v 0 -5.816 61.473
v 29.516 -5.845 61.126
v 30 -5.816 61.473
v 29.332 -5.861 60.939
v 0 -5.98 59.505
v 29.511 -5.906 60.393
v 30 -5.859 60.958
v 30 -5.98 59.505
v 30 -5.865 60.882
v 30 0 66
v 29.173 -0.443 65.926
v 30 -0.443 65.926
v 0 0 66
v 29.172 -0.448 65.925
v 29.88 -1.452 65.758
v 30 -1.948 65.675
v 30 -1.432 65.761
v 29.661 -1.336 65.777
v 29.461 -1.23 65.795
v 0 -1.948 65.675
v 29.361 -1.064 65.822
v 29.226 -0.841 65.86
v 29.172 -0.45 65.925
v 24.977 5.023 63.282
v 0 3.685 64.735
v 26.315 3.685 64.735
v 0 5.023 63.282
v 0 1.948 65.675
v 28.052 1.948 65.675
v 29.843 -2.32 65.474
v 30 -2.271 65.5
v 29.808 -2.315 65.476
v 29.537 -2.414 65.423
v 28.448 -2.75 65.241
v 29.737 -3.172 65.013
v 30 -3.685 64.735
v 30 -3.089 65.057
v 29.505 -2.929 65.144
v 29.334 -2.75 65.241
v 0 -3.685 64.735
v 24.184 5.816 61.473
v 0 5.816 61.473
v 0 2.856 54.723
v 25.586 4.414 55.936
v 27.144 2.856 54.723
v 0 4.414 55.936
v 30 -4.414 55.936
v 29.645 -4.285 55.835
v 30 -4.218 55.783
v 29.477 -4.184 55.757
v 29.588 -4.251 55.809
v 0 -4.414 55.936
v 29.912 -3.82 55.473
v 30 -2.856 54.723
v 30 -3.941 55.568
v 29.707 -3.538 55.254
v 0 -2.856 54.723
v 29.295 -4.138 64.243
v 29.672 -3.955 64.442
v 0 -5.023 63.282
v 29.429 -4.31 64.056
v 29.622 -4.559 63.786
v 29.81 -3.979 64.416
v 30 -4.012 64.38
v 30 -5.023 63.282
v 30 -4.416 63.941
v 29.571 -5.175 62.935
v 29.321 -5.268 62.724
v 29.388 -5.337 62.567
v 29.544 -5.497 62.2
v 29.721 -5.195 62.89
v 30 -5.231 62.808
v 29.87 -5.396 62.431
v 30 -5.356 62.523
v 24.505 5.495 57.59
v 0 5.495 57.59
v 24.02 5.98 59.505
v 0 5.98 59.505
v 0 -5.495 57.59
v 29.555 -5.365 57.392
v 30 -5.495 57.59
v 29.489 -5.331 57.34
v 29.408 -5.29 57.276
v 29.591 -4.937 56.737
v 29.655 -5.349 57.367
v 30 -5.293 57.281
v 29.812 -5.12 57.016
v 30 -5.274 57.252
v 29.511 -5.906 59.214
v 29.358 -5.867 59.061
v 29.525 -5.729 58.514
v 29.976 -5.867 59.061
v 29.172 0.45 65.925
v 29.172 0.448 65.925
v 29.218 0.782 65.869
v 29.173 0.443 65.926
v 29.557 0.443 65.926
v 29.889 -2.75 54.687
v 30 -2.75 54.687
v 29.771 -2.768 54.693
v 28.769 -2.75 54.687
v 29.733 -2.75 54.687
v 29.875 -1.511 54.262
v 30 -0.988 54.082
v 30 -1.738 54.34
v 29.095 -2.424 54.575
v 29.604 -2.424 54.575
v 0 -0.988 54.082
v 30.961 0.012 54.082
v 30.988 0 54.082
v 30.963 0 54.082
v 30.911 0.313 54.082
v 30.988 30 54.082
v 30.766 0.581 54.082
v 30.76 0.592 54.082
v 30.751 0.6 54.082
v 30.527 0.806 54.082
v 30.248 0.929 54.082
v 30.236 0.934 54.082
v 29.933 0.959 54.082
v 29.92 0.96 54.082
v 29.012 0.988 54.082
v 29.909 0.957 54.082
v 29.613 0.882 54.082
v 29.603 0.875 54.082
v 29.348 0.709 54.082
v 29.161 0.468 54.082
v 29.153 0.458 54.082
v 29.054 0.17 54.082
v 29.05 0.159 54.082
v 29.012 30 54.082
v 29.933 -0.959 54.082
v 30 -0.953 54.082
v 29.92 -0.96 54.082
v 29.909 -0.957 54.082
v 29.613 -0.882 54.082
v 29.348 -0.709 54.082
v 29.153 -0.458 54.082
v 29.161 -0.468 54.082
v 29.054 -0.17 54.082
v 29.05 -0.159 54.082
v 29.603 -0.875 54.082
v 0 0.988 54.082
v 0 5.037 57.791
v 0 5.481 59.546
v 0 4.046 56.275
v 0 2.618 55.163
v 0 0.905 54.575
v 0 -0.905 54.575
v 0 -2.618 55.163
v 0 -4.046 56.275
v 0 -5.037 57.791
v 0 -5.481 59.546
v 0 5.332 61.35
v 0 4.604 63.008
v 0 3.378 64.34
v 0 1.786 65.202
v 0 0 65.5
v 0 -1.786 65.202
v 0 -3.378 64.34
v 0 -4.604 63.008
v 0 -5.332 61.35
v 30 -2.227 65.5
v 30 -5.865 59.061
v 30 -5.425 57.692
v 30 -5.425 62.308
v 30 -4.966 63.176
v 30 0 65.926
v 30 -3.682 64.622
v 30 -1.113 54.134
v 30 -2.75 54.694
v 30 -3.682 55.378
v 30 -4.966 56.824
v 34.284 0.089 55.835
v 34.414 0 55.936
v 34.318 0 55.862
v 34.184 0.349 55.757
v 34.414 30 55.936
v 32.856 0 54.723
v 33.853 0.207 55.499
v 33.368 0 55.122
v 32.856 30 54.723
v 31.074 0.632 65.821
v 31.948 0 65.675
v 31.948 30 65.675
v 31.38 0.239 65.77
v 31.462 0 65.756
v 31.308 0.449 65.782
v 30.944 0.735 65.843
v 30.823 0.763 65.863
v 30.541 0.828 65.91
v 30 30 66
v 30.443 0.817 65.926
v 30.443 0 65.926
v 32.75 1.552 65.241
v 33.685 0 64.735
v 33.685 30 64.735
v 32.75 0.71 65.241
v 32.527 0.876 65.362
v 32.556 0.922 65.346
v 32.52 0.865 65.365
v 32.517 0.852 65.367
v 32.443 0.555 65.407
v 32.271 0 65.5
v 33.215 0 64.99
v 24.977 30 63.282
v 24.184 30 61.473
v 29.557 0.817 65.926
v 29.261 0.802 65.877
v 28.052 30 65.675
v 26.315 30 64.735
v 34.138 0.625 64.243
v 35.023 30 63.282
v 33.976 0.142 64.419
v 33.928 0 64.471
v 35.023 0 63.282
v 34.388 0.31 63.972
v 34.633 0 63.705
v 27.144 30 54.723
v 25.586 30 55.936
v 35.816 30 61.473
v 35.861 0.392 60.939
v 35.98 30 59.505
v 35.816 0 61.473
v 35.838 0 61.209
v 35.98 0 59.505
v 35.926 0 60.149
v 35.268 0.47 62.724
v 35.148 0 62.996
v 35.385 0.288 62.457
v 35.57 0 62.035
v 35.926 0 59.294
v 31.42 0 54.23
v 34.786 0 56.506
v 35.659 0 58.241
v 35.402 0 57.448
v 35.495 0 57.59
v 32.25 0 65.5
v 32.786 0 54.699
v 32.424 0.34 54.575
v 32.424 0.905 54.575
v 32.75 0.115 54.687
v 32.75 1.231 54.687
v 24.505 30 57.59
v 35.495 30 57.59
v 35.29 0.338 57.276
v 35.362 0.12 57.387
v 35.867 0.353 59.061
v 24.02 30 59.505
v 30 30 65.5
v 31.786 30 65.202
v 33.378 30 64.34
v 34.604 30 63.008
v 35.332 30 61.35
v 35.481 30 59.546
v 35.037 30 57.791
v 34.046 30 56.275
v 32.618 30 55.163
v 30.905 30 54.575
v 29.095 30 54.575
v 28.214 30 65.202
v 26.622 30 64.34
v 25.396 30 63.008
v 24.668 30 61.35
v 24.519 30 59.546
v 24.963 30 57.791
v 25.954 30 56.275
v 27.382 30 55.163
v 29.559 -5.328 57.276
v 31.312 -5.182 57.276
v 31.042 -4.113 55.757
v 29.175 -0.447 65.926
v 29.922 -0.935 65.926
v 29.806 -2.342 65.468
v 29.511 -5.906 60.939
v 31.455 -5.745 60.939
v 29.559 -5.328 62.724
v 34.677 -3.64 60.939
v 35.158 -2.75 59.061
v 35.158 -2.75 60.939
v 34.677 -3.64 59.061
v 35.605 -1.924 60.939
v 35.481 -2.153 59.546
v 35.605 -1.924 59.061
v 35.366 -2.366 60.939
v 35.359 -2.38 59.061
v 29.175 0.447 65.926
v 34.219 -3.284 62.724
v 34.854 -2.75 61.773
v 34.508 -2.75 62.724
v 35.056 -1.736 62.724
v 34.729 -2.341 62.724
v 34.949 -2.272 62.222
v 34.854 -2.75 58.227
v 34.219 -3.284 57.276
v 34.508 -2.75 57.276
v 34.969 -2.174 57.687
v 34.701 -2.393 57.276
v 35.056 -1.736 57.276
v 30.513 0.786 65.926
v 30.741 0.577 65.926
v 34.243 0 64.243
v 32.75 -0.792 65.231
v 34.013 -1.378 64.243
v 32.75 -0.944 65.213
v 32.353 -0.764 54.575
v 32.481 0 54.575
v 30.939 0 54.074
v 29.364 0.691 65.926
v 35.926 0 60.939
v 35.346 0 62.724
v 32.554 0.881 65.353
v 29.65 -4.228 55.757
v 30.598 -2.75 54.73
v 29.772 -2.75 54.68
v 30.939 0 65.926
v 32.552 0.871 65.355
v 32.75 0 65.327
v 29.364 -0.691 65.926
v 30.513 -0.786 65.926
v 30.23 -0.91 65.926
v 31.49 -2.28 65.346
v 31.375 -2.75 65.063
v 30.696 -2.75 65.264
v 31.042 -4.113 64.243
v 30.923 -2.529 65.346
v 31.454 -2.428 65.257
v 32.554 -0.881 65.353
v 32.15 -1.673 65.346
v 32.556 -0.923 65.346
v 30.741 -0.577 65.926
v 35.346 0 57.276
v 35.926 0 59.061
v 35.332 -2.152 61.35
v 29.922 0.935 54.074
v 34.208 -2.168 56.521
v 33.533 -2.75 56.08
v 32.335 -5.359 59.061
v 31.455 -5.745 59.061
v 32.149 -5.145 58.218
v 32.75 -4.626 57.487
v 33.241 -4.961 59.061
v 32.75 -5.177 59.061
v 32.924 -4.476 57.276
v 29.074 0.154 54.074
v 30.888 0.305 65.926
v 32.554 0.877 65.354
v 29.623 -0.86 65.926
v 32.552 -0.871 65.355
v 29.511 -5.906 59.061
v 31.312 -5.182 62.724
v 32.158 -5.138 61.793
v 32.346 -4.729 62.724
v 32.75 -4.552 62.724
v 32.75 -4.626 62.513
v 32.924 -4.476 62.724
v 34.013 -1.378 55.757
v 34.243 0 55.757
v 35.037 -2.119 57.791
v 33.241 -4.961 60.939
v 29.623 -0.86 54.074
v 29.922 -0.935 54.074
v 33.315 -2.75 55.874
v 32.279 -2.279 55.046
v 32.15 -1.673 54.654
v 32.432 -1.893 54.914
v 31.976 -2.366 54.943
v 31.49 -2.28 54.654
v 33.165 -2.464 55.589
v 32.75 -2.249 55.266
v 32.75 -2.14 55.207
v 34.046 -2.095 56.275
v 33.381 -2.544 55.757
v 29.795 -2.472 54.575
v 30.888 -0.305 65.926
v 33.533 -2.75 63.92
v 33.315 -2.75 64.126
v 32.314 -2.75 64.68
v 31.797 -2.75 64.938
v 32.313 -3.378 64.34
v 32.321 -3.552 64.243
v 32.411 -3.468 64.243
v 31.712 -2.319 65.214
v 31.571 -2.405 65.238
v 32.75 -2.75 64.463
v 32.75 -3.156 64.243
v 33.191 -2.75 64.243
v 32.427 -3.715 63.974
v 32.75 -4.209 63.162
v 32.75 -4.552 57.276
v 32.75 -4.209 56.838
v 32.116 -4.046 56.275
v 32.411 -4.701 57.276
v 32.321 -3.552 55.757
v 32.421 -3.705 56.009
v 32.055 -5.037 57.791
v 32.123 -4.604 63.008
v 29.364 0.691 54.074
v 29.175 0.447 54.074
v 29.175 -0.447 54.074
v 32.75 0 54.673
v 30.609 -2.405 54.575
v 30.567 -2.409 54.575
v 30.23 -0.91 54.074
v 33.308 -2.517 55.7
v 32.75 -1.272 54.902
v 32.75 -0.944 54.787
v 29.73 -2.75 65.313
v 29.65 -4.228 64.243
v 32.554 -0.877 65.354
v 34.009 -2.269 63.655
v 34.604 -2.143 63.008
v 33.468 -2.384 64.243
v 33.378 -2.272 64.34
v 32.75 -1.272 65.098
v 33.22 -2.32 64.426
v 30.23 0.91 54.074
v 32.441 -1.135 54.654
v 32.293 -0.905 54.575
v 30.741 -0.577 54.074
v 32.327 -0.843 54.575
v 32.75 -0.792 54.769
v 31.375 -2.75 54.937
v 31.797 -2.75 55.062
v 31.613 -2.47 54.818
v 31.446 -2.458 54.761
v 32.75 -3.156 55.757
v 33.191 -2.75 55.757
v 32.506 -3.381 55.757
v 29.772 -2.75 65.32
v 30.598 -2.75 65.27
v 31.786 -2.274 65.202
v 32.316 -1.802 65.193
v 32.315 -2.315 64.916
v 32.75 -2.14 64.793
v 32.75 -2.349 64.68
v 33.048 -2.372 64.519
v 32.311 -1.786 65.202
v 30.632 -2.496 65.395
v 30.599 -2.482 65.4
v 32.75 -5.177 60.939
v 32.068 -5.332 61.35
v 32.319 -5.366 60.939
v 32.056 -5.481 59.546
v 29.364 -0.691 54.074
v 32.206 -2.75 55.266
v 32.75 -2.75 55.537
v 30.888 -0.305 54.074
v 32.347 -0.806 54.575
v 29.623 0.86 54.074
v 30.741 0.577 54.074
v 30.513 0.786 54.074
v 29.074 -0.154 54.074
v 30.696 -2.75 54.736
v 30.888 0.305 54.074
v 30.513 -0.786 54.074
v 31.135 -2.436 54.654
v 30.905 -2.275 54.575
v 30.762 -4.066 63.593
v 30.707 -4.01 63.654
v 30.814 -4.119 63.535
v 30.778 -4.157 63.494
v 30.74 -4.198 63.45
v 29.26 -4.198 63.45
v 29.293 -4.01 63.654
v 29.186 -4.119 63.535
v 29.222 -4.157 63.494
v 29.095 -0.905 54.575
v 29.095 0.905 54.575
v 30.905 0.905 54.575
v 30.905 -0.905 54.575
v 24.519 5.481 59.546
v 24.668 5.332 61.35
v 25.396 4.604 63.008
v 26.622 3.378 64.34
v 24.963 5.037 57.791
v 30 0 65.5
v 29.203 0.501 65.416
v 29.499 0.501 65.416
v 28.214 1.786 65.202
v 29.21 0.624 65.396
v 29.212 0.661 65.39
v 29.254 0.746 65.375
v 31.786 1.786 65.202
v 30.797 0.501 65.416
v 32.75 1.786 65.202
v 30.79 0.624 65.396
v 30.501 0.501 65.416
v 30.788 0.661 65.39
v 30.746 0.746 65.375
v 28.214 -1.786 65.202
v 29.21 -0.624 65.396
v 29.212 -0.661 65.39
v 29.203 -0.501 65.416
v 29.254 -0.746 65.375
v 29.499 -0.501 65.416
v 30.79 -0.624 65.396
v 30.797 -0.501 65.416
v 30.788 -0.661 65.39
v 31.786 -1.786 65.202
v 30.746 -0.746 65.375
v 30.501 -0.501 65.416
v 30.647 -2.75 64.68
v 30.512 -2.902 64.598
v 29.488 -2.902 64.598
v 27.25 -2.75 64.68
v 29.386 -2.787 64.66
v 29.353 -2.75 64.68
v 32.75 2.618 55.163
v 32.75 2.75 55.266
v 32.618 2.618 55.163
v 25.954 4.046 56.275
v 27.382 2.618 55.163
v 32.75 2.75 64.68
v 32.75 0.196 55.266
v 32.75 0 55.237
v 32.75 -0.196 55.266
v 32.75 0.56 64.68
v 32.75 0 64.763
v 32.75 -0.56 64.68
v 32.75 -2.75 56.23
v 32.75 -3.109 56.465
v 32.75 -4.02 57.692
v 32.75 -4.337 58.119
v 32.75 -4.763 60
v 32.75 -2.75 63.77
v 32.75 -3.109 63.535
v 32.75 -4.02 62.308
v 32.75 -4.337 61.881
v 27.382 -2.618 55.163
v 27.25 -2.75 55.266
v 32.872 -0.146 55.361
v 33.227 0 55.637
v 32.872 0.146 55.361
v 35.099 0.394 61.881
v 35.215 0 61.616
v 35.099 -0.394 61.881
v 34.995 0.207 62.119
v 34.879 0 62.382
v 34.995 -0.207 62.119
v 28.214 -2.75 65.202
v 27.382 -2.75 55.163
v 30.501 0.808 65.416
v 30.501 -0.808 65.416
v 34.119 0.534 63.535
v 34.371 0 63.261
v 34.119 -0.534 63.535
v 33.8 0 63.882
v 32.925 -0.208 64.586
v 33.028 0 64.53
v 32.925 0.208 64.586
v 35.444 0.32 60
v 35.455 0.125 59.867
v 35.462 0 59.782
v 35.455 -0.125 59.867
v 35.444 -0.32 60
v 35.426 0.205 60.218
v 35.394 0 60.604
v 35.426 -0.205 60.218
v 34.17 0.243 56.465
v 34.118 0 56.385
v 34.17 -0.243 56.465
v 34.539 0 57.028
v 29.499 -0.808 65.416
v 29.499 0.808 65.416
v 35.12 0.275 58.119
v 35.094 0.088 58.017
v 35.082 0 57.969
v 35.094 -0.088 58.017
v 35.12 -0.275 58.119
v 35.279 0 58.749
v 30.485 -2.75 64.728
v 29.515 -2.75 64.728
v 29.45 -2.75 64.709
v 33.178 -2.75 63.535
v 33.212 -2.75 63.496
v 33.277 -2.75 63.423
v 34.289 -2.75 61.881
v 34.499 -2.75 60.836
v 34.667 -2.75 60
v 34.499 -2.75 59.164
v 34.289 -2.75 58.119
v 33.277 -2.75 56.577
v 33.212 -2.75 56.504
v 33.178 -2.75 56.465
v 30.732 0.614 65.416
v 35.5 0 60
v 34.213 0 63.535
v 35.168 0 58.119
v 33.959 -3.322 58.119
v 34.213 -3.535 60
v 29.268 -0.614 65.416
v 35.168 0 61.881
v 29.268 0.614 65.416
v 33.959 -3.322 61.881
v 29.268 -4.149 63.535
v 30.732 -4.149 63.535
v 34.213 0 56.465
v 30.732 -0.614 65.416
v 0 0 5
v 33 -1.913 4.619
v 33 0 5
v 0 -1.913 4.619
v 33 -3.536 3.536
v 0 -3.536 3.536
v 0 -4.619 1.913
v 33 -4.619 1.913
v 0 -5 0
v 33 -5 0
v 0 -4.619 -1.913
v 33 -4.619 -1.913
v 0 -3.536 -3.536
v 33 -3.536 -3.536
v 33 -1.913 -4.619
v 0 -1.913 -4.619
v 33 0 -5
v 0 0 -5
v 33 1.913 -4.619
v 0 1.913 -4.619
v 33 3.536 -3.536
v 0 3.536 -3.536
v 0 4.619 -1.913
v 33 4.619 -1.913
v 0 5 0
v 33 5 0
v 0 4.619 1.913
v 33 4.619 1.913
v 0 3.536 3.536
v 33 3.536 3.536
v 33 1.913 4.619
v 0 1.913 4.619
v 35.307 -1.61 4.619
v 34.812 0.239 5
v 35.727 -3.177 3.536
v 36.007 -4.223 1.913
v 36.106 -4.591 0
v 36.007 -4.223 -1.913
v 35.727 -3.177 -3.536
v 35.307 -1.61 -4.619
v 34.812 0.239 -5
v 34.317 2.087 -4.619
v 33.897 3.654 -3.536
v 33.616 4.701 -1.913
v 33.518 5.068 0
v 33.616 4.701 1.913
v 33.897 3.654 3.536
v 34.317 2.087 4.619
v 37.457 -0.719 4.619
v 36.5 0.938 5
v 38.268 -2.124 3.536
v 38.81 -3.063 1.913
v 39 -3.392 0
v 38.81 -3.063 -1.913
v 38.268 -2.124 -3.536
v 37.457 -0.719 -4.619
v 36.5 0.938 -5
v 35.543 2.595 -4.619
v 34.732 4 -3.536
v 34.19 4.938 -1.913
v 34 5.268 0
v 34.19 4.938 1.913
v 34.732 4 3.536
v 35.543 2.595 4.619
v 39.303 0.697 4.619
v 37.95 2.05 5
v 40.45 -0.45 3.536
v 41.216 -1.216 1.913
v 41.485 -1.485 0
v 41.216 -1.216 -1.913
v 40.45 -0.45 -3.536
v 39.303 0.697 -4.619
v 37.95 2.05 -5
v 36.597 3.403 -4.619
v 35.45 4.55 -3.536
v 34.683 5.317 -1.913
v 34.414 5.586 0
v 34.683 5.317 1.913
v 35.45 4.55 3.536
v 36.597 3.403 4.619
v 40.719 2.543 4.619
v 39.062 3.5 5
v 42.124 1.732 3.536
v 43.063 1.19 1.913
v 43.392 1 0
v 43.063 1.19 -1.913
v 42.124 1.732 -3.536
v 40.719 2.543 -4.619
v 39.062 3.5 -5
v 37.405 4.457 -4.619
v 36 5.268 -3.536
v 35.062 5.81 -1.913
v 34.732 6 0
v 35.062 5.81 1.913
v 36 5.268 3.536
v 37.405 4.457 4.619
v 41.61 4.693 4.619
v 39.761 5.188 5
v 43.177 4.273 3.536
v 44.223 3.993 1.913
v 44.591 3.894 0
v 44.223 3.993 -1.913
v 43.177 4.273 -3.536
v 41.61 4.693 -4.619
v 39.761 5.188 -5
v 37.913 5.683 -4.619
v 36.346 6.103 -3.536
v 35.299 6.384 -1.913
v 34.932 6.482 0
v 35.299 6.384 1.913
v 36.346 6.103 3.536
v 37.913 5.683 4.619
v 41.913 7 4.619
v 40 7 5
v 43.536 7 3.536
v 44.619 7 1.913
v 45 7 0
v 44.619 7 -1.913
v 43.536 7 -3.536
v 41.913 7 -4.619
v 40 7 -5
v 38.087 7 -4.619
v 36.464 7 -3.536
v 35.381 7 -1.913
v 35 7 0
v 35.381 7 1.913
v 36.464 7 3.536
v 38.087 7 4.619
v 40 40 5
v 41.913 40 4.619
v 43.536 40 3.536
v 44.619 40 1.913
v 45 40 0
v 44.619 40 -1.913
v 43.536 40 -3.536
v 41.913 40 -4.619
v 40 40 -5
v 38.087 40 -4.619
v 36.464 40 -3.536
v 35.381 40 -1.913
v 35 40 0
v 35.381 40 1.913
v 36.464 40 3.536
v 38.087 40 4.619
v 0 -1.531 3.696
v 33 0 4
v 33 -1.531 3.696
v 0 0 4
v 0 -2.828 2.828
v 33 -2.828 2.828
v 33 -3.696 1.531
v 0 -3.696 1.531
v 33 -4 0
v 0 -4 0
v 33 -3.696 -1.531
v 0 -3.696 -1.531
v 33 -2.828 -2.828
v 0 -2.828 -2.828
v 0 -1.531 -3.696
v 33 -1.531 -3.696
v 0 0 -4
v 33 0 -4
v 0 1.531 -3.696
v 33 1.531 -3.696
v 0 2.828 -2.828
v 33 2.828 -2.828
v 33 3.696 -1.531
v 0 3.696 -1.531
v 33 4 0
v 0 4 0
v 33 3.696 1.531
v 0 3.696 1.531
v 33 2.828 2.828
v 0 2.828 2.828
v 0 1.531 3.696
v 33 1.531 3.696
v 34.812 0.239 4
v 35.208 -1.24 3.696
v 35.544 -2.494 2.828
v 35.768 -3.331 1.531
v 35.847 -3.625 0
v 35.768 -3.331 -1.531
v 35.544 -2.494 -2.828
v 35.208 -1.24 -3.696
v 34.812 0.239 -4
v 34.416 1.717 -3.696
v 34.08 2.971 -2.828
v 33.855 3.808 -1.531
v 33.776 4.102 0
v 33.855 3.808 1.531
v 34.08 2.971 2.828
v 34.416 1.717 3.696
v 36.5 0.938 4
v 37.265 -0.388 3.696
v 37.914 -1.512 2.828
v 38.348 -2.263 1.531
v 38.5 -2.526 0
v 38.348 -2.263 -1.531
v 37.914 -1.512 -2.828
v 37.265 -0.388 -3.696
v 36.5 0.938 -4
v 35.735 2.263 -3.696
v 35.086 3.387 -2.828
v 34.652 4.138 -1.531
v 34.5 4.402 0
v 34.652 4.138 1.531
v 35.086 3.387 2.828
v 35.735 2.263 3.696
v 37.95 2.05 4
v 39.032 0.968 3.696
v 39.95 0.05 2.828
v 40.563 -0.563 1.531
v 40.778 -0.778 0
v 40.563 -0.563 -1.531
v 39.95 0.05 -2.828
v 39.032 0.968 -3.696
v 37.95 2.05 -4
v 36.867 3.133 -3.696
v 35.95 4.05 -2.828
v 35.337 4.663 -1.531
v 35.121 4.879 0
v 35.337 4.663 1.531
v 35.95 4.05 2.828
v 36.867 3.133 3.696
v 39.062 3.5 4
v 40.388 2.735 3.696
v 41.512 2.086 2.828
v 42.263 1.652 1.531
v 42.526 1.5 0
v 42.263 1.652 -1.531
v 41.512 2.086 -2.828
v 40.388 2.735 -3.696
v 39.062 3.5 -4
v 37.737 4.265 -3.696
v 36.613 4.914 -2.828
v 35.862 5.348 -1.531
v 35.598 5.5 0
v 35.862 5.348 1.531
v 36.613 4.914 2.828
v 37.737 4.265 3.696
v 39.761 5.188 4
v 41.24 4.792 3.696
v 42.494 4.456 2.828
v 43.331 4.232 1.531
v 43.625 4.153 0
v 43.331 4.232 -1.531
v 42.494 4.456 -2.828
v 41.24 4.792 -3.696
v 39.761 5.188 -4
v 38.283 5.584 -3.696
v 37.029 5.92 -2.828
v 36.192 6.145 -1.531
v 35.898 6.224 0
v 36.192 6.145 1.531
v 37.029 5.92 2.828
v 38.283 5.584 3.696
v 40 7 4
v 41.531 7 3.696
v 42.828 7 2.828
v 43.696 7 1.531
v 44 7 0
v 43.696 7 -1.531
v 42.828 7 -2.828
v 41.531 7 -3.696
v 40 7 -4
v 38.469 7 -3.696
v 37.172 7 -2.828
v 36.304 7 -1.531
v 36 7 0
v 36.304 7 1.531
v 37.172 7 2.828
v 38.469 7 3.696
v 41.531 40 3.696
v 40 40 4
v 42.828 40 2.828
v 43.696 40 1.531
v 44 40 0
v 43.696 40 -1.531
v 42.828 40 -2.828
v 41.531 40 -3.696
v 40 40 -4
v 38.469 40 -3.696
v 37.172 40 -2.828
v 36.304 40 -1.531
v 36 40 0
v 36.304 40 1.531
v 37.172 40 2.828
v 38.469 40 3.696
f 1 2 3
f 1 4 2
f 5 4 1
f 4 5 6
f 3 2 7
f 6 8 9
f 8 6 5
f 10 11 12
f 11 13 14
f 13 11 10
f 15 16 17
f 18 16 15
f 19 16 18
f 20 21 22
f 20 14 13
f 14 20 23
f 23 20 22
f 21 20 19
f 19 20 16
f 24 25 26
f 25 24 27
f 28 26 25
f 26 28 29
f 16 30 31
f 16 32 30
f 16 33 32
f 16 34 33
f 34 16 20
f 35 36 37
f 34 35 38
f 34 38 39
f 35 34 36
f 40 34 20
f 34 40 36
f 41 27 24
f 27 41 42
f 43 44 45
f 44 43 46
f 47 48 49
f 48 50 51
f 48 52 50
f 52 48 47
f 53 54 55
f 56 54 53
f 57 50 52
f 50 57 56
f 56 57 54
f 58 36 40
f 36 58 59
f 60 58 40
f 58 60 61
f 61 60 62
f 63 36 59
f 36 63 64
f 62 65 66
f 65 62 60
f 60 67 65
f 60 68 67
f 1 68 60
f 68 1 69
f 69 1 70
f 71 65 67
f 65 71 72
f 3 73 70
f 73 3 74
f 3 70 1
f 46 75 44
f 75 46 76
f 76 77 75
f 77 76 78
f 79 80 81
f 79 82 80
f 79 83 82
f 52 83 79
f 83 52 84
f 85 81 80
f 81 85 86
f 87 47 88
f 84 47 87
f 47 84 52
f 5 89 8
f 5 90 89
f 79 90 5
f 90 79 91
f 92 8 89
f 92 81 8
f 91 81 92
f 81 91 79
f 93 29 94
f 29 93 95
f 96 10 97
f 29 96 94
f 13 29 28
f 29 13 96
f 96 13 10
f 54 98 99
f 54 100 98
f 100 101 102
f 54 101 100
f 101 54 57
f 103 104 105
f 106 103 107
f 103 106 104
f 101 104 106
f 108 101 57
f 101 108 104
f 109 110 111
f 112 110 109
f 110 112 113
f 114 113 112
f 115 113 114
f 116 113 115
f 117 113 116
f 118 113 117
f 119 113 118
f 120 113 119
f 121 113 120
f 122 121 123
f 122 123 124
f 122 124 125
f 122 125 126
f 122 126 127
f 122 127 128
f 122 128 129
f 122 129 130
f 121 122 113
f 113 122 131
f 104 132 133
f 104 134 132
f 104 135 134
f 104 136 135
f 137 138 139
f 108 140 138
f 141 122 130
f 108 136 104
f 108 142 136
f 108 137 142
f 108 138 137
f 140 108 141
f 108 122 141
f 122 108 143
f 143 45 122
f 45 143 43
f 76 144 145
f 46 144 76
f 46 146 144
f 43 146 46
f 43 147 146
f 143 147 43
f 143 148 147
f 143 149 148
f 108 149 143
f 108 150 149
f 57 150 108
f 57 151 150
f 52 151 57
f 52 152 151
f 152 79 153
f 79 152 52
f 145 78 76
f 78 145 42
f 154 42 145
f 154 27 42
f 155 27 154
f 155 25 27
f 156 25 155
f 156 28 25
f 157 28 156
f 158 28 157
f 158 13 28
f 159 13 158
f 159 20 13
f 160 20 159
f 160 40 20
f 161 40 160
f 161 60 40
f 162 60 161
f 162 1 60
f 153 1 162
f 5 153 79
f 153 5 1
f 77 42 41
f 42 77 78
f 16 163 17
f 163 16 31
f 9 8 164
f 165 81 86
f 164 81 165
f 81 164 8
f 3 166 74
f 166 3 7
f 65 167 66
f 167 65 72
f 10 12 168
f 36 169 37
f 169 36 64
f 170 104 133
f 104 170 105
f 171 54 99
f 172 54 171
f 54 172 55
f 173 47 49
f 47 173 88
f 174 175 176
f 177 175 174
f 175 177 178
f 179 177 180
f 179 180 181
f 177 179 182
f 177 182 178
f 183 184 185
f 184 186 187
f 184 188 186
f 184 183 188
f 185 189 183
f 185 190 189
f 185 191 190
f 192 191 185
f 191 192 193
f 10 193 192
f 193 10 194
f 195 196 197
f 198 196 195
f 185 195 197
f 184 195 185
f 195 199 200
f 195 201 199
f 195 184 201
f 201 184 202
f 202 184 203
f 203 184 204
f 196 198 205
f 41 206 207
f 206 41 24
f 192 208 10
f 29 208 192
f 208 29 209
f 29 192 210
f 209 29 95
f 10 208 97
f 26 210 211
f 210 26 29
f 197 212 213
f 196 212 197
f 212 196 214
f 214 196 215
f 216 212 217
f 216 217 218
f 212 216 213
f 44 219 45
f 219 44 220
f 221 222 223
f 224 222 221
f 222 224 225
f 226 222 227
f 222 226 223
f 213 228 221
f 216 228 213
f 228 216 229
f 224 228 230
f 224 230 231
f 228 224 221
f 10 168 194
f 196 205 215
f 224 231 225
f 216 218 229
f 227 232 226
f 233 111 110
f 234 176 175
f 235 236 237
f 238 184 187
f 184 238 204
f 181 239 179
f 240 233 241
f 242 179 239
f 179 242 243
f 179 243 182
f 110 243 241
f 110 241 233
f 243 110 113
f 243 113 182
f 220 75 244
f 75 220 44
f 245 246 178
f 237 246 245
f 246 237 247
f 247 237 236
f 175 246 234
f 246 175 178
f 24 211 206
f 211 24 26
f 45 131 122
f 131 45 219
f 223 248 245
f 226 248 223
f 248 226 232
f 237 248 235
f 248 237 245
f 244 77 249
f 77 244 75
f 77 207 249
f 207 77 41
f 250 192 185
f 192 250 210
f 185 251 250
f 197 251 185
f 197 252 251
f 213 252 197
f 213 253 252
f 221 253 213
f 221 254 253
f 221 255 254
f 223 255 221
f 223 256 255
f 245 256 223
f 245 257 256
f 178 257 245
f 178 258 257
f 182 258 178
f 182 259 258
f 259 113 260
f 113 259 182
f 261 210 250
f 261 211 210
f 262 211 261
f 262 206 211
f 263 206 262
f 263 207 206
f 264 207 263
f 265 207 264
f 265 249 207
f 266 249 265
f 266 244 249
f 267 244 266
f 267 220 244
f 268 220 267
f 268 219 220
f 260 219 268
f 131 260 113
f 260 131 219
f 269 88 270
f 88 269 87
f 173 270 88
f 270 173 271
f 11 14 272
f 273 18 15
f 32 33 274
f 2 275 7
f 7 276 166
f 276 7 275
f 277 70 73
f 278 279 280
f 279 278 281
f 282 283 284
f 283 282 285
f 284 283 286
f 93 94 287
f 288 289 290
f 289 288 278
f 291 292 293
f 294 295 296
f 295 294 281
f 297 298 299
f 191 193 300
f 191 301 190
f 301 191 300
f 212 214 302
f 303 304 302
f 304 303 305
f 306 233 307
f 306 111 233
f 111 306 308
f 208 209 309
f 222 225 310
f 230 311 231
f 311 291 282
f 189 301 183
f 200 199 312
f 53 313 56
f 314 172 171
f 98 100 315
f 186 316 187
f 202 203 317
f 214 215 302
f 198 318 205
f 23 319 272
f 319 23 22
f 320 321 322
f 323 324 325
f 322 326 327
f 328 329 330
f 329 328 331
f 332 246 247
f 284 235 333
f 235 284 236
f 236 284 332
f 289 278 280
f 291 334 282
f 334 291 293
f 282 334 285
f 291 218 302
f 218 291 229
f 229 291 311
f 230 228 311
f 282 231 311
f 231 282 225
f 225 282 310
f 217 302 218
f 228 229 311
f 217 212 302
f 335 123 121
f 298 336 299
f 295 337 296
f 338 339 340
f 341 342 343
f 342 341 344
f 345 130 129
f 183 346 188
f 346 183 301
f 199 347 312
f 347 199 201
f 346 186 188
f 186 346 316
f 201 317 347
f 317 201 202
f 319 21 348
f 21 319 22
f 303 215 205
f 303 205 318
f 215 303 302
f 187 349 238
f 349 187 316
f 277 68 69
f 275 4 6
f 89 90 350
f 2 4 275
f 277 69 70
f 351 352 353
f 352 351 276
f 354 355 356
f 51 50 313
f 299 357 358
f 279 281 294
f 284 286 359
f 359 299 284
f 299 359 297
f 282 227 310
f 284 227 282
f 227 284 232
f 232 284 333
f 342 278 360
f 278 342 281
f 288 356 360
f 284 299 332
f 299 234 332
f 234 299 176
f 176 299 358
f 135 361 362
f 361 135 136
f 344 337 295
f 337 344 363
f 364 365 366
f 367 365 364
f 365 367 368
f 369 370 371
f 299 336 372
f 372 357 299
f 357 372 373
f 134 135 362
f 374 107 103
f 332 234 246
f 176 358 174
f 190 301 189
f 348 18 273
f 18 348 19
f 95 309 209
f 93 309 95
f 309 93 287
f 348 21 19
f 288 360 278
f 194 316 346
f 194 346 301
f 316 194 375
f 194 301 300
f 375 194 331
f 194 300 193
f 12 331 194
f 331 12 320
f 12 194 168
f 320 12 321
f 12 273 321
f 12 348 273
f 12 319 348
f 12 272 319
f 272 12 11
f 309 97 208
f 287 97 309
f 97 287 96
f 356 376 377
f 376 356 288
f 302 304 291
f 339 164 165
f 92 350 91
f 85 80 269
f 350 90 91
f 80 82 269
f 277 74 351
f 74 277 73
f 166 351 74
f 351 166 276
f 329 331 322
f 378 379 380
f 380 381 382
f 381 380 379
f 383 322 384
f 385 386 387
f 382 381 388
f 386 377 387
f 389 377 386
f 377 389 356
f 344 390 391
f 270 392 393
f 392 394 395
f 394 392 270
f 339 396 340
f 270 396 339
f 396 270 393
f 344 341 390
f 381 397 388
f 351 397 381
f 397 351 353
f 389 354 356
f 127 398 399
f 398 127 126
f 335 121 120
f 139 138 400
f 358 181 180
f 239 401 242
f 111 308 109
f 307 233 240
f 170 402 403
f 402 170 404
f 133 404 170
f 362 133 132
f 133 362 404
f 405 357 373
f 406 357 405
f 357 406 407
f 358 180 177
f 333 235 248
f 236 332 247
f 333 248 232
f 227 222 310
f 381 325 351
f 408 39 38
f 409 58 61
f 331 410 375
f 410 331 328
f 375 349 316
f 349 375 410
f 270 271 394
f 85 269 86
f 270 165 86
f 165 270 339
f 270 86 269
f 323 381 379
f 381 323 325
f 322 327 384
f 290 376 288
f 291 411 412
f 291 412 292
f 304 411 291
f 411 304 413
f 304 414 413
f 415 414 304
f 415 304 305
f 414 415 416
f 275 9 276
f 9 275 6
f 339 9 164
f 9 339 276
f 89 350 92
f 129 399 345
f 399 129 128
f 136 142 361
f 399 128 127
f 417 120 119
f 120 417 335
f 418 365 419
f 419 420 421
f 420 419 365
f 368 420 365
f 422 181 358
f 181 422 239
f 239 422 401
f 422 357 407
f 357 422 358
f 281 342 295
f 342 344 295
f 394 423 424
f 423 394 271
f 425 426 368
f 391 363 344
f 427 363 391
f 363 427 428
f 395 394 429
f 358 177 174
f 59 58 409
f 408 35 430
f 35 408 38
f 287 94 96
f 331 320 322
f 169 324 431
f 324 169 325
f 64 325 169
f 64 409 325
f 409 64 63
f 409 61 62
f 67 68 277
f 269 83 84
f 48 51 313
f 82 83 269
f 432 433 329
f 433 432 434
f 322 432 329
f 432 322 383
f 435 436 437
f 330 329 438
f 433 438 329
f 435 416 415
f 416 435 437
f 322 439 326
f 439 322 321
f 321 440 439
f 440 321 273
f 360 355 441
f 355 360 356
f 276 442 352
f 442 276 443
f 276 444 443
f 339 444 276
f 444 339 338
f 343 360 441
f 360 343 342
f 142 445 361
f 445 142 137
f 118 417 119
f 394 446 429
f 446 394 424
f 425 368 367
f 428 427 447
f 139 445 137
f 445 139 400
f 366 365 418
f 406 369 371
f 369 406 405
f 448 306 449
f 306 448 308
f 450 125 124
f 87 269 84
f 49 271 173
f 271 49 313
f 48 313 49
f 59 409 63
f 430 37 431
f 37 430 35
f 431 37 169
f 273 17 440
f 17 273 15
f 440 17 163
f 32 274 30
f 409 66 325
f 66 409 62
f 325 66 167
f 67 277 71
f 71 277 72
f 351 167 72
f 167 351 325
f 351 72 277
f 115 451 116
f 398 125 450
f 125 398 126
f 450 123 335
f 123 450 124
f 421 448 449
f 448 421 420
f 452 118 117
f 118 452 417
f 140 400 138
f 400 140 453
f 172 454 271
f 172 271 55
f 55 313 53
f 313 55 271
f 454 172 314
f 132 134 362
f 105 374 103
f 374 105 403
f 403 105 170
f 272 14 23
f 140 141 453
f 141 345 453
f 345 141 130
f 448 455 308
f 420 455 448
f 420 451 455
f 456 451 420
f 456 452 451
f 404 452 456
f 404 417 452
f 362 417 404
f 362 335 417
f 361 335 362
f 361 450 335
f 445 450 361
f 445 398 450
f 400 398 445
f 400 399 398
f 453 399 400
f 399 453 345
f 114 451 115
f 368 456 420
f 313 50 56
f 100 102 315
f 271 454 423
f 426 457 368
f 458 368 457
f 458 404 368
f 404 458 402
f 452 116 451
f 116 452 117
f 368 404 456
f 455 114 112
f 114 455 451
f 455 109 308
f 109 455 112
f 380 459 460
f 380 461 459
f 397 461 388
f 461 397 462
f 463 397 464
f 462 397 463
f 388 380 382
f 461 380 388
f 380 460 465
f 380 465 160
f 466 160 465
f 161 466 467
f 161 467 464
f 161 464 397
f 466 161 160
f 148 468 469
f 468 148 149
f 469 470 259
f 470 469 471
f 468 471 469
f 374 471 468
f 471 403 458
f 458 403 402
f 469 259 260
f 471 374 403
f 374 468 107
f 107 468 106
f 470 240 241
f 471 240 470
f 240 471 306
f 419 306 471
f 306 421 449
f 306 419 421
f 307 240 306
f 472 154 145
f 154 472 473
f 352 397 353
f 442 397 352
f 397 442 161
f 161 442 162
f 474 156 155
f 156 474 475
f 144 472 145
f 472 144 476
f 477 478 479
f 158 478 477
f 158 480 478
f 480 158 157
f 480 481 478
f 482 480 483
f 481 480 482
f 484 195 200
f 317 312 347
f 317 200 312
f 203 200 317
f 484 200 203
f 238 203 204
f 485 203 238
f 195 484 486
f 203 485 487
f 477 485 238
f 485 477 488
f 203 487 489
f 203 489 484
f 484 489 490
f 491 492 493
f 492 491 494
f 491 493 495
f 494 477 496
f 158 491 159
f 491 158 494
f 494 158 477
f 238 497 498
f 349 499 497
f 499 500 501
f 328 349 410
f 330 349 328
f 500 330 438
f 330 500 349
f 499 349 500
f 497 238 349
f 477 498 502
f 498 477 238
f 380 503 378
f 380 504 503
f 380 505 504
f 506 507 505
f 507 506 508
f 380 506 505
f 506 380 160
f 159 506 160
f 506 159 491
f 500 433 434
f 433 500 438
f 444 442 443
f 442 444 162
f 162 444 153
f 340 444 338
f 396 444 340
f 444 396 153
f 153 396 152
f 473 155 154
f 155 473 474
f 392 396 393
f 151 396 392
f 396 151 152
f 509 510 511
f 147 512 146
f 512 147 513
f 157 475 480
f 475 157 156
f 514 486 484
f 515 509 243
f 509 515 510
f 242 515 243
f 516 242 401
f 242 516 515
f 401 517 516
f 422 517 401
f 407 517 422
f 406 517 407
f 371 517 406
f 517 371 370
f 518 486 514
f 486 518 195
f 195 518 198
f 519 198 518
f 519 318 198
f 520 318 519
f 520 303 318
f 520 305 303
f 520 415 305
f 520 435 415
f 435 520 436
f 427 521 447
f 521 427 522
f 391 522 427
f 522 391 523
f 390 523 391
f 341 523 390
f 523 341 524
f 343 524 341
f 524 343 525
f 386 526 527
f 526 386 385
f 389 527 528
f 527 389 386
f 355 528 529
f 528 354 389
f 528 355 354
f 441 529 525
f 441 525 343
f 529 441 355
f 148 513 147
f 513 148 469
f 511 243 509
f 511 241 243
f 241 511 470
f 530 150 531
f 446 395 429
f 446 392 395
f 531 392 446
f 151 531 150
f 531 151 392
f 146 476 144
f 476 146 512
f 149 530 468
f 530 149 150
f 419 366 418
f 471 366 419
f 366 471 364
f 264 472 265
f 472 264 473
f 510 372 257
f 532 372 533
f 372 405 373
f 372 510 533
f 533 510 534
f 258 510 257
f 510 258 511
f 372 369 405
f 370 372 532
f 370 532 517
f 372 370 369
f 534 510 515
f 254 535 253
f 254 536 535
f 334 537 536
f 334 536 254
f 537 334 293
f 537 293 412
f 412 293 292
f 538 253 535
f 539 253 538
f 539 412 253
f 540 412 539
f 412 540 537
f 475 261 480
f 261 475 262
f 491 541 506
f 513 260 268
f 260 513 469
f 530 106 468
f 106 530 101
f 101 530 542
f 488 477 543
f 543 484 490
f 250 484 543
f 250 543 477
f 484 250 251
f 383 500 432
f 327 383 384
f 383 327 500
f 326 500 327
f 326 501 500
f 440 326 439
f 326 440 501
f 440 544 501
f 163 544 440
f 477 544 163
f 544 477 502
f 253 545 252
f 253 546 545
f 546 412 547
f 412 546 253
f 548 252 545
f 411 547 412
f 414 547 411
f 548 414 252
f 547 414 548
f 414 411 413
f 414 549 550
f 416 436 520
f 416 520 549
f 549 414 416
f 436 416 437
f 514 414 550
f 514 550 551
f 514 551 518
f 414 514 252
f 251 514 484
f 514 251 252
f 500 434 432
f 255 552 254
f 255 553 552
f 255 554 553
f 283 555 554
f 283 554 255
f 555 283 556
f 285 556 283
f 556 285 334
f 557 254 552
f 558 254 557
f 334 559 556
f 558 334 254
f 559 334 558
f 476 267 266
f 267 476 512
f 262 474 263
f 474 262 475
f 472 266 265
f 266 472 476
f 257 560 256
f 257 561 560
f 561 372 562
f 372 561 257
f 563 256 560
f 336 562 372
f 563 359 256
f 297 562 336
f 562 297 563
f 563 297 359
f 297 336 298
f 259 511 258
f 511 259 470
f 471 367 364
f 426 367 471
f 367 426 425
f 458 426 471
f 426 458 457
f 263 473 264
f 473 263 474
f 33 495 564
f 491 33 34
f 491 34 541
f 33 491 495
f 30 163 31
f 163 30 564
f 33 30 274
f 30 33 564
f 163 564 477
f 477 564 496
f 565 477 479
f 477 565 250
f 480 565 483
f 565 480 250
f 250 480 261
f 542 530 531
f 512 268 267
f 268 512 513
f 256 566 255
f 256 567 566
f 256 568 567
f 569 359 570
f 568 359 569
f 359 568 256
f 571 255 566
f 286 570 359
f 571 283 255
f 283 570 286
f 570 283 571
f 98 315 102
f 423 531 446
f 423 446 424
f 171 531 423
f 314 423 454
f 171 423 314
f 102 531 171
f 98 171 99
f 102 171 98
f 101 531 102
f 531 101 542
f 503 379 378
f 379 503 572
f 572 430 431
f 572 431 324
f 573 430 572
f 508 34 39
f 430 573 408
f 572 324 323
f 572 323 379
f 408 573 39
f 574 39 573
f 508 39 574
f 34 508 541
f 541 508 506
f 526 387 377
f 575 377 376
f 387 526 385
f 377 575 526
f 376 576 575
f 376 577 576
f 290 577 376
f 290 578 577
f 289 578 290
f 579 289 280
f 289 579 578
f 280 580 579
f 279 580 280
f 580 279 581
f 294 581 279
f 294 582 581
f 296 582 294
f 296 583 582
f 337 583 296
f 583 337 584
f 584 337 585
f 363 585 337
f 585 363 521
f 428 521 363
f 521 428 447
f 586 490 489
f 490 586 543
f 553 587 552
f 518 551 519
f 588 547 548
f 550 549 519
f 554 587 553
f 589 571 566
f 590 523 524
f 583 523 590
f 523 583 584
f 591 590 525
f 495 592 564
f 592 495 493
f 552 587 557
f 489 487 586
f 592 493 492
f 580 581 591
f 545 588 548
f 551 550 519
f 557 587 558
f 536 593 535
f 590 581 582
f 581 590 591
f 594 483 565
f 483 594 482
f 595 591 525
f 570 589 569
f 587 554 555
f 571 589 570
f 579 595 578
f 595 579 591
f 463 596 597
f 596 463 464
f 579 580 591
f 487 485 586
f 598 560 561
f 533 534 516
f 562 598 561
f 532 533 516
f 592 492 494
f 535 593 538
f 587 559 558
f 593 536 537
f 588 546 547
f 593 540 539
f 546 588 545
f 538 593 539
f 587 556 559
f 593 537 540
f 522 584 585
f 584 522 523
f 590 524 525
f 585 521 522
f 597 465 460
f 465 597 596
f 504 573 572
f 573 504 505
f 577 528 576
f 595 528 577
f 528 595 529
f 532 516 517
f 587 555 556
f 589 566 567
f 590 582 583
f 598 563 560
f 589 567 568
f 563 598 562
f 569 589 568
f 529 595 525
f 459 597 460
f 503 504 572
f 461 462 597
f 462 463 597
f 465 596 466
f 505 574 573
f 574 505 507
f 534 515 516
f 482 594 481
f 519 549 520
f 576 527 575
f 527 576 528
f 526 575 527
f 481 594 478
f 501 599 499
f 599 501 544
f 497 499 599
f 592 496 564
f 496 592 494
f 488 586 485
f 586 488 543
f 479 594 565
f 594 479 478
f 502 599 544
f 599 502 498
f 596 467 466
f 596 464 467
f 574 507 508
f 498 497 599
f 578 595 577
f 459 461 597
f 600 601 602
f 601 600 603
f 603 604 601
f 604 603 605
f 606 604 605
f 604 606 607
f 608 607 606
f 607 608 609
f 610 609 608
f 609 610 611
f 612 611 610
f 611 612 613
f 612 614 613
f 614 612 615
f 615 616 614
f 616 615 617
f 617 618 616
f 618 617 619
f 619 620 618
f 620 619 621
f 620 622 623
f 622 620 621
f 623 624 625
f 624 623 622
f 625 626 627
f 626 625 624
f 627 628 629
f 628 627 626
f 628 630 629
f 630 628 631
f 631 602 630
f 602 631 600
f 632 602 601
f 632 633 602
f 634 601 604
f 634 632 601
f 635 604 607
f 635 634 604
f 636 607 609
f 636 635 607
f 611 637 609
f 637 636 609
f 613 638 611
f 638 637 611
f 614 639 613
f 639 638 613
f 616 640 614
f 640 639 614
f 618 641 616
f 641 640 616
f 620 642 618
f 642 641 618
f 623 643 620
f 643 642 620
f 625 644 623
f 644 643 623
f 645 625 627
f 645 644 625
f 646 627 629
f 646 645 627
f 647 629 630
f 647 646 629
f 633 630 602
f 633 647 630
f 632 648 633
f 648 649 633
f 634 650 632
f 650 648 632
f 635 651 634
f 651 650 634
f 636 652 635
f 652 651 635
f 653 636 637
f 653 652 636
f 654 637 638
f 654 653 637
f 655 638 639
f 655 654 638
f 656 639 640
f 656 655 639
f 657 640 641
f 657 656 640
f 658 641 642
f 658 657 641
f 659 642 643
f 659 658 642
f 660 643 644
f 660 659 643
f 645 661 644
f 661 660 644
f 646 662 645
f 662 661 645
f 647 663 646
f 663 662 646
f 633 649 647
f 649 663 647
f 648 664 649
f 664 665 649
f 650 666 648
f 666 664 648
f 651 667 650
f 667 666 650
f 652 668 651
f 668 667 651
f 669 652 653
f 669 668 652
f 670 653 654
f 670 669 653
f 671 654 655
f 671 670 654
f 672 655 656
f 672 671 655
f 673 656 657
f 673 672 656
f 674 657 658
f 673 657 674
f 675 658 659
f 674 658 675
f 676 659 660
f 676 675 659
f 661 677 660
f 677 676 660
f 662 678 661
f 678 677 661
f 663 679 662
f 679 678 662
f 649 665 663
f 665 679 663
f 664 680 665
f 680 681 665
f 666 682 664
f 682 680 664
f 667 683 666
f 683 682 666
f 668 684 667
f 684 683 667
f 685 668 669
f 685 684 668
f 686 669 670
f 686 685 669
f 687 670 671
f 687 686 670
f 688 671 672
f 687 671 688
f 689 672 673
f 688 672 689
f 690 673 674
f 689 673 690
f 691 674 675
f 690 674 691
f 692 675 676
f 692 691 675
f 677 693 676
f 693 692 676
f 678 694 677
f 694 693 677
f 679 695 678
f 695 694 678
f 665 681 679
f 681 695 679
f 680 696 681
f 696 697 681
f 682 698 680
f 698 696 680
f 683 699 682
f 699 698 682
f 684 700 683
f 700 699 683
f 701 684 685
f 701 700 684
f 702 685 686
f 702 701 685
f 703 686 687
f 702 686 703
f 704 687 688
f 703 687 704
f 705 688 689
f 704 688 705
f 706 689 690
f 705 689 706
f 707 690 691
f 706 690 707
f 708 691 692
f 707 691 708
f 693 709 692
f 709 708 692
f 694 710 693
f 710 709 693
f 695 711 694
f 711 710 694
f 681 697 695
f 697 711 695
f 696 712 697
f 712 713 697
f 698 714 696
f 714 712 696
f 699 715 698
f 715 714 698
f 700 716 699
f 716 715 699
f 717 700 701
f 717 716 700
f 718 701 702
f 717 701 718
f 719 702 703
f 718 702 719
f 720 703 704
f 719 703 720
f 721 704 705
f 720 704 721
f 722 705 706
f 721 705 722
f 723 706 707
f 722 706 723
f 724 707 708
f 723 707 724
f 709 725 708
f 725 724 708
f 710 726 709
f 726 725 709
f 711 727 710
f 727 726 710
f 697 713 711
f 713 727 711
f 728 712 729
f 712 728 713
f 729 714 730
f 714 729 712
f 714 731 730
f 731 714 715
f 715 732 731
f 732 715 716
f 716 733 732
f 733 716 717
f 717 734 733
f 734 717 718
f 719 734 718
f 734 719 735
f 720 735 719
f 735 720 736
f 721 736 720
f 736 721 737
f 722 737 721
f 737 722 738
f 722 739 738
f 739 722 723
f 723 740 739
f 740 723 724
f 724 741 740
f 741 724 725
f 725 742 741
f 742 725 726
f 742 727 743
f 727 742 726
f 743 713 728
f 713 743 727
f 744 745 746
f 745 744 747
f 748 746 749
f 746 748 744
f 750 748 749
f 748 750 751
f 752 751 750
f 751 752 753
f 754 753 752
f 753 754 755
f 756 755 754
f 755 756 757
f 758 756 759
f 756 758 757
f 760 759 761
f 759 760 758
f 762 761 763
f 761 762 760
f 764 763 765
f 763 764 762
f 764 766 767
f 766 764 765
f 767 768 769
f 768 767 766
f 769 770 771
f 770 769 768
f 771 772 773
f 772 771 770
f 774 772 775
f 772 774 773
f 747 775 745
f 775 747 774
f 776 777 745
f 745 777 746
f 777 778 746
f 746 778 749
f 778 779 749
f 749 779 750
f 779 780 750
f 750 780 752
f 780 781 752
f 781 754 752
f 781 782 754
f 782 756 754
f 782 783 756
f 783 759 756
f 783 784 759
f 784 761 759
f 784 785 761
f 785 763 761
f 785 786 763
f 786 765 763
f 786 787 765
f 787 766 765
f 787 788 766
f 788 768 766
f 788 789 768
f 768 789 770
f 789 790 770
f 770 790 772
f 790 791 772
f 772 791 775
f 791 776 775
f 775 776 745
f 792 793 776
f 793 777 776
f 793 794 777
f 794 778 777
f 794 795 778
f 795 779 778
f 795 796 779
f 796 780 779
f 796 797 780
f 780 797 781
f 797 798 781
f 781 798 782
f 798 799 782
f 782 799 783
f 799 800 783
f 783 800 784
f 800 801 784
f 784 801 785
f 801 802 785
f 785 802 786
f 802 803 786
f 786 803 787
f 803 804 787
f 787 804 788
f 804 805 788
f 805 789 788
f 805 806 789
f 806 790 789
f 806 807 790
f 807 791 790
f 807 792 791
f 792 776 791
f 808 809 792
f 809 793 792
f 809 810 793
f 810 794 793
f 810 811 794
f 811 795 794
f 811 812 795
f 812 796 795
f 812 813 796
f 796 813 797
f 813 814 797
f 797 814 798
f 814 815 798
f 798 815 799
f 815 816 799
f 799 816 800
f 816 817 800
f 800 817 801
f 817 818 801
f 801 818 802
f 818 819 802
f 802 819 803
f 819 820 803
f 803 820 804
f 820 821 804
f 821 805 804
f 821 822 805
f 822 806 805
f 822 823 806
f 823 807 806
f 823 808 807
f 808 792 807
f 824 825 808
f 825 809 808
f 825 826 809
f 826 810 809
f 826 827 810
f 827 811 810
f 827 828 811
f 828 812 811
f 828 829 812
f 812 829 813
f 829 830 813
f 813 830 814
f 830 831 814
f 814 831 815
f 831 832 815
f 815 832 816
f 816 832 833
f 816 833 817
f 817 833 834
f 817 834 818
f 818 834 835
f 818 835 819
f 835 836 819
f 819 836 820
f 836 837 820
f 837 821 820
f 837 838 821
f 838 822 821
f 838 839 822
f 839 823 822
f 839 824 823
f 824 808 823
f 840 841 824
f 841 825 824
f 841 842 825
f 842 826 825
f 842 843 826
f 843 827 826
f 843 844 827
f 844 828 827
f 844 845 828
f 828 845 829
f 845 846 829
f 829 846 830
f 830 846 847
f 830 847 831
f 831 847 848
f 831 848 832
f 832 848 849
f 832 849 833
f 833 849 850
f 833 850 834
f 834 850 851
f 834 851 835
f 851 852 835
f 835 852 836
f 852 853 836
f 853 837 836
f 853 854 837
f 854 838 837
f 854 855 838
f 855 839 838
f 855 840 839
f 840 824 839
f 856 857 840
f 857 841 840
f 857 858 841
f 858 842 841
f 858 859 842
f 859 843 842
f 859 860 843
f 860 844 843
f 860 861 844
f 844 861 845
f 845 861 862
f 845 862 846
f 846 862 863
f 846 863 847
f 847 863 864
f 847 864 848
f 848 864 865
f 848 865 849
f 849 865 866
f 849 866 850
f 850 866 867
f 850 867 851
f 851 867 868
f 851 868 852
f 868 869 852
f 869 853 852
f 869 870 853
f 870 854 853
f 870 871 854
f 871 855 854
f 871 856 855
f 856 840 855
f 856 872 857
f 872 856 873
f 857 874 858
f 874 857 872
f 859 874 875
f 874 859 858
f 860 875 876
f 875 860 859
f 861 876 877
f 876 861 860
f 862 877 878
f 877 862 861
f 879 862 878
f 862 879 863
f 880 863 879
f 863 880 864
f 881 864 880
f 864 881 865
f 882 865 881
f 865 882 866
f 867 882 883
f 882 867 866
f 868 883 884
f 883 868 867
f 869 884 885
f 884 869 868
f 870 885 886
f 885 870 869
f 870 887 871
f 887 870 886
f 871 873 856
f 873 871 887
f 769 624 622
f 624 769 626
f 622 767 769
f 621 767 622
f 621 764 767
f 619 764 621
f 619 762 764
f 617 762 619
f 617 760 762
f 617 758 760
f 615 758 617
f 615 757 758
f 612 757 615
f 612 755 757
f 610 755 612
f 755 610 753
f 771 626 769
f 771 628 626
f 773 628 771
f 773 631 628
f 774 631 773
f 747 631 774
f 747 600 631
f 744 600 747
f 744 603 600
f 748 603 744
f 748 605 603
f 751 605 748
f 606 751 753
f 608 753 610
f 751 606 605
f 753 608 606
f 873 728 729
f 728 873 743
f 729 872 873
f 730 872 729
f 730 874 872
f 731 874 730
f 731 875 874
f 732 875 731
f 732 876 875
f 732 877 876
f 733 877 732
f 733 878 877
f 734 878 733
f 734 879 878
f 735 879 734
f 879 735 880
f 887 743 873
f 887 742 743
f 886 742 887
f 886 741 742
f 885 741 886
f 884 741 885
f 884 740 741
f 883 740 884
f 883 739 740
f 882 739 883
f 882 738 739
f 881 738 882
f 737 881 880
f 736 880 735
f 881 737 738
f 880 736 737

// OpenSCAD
// Provokes EVERY advisory warning the library can emit, so that silencing one
// is caught. This cannot live in tests/guards/: a guard must ABORT, and these
// are echo() calls that deliberately do not.
//
// --hardwarnings does NOT promote them -- they are ECHO: lines, not WARNING:
// lines -- so a green `just check` is NOT evidence that no uniTube warning was
// emitted. `just warnings` is what checks these, by asserting each one appears.

// clang-format off
use <../../src/uniTube.scad>;
// clang-format on

$fa = 12;
$fs = 2;

// CHECK-2 — a bend tighter than one full od. Legal, but tight to print.
// CHECK-3 — a wall below ut_min_wall(). Renders perfectly, prints as a hole.
ut_tube(ut_polyline([ [ 0, 0, 0 ], [ 40, 0, 0 ], [ 40, 40, 0 ] ], r = 7), ut_round(od = 10, id = 8));

// NET-4 — a joint ball whose own wall is below the minimum.
translate([ 0, 0, 60 ])
{
    prof = ut_round(od = 12, id = 11); // 0.5 mm wall
    a = ut_run("a", ut_polyline([ [ 0, 0, 0 ], [ 30, 0, 0 ] ]), prof);
    b = ut_run("b", ut_polyline([ [ 30, 0, 0 ], [ 30, 30, 0 ] ]), prof);
    ut_assemble(ut_net([ a, b ], [ut_joint([ [ "a", "b" ], [ "b", "a" ] ])]));
}
